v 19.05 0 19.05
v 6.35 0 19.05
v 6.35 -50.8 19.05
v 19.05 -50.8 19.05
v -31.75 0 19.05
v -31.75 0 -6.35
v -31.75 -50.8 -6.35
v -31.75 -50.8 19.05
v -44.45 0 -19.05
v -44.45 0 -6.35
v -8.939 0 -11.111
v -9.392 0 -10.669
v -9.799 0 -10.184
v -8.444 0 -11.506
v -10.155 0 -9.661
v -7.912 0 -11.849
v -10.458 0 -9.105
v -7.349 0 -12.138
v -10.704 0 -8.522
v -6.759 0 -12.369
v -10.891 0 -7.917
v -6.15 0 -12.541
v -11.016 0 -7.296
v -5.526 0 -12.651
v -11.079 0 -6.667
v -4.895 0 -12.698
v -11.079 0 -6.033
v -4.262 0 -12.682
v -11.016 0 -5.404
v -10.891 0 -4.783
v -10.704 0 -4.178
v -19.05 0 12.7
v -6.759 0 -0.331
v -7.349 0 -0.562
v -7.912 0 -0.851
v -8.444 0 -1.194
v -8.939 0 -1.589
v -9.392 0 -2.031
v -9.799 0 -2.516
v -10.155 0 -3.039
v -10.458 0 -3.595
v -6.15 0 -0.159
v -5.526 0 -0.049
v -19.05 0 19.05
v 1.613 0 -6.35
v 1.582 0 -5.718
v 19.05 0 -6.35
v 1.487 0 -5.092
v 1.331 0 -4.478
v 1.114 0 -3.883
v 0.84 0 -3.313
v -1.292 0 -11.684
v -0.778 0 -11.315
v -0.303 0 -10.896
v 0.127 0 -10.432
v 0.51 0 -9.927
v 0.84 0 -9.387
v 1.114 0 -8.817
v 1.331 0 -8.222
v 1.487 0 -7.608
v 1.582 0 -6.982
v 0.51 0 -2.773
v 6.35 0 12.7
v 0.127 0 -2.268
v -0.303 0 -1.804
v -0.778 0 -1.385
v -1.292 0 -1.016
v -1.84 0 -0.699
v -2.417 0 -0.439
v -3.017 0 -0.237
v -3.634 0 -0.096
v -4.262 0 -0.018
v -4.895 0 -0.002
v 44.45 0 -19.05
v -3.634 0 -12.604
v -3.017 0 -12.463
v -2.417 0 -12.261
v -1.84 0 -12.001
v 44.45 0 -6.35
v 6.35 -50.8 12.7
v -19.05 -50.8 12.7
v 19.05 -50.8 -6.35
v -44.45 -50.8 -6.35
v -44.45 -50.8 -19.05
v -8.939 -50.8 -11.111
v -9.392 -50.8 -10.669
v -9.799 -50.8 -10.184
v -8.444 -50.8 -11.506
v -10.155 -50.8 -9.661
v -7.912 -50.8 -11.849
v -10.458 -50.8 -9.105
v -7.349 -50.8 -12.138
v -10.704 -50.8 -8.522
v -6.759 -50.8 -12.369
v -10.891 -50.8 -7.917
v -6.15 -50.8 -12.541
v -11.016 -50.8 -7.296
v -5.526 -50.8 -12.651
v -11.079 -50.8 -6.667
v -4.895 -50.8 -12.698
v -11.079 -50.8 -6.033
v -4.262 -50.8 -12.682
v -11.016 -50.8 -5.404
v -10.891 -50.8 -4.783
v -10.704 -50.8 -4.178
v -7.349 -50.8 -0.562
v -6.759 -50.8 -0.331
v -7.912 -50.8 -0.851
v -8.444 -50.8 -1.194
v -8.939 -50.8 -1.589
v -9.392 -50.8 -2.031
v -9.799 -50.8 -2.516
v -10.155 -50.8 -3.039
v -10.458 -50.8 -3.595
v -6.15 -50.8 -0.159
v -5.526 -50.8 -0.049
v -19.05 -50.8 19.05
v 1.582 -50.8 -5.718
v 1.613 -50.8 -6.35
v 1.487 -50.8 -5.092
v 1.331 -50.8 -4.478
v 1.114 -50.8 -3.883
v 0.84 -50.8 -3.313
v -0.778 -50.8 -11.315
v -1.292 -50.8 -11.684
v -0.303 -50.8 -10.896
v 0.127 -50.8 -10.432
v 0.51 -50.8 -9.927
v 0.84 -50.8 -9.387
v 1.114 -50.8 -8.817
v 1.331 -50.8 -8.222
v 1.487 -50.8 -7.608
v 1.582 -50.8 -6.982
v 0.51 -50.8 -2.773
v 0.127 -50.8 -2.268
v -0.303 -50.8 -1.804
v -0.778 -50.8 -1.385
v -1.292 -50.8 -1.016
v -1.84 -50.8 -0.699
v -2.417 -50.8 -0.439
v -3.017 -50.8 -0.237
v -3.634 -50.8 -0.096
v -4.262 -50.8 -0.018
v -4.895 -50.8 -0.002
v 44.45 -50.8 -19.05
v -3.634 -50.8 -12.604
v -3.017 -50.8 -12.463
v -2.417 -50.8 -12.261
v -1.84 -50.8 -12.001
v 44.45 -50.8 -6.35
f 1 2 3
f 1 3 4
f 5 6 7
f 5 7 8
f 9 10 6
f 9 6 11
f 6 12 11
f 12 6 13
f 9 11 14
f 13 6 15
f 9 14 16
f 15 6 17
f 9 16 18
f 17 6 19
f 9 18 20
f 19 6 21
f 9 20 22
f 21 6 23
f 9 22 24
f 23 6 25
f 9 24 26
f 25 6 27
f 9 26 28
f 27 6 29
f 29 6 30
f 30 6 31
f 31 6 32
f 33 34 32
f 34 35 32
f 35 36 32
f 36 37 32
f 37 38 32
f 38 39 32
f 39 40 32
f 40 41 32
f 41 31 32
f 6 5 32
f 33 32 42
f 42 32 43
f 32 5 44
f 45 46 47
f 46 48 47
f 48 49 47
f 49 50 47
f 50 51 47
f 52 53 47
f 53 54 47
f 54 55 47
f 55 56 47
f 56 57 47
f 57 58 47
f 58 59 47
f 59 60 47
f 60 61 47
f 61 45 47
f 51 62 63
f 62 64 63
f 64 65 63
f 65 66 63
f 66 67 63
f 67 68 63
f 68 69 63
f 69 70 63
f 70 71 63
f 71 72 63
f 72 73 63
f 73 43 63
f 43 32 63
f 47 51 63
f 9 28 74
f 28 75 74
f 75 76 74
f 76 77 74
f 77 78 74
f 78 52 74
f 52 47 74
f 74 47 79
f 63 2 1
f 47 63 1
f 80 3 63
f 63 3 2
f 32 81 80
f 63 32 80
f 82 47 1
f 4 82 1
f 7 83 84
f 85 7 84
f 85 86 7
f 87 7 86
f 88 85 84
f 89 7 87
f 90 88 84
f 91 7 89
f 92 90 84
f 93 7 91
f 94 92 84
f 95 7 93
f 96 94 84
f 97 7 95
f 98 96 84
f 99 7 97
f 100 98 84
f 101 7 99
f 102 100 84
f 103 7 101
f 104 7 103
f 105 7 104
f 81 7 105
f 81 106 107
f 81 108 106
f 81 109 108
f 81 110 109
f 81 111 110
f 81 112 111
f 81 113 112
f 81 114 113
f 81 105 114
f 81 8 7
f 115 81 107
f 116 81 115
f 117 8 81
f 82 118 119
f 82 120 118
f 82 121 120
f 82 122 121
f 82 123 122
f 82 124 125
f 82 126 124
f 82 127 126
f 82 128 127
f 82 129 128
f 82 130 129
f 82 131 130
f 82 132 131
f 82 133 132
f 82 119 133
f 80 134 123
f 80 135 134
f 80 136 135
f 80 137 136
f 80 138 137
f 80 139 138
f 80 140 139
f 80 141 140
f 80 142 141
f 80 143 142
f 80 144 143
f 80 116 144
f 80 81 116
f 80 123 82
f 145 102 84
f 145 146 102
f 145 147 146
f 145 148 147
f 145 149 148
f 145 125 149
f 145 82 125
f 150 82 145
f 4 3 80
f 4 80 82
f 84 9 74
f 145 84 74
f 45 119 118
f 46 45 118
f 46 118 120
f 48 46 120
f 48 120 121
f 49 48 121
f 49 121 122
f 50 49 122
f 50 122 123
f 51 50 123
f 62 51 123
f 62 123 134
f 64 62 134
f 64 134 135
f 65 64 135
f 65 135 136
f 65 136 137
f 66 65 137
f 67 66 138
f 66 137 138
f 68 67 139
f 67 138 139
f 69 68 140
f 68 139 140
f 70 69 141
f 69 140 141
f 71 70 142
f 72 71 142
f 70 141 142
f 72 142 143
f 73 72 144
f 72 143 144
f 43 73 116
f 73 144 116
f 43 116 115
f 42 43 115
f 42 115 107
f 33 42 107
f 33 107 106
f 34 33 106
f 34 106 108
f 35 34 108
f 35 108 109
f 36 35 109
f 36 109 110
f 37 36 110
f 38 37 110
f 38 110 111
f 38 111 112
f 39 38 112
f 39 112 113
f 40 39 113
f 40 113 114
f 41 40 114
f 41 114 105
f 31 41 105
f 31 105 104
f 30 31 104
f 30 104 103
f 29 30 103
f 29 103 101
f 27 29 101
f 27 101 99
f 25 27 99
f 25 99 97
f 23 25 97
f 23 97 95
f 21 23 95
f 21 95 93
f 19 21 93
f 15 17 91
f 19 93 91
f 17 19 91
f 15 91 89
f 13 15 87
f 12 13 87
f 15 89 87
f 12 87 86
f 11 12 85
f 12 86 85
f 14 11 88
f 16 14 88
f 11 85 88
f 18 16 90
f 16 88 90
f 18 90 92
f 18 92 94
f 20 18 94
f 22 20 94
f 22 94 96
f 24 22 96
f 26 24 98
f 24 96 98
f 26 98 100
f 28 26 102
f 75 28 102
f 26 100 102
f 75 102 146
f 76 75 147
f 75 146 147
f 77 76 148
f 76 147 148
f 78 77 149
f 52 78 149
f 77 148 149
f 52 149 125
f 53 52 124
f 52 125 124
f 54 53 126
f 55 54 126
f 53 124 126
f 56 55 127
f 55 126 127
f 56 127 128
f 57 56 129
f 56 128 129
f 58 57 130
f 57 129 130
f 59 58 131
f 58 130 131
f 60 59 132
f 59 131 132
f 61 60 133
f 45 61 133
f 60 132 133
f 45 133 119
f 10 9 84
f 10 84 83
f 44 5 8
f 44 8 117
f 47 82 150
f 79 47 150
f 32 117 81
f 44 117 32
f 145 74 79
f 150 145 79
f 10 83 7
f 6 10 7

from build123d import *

# Parameters (mm, degrees)
F0_W     = 88.9
F0_H     = 38.1
F1_DEPTH = 50.8
F2_W     = 12.7
F2_H     = 25.4
F3_DEPTH = 50.801
F4_W     = 25.4
F4_H     = 25.4
F5_DEPTH = 50.801
F6_R     = 6.35
F7_DEPTH = 50.801
F8_W     = 25.4
F8_H     = 50.8
F9_DEPTH = 6.35


with BuildPart() as f1:
    # F0 (on Front) → F1 (new body)
    with BuildSketch(Plane.XZ):
        Rectangle(F0_W, F0_H)
    extrude(amount=F1_DEPTH)

    # F2 (on face) → F3 (cut, through all)
    with BuildSketch(Plane.XZ.offset(50.8)):
        with Locations((-38.1, 6.35)):
            Rectangle(F2_W, F2_H)
    extrude(amount=-F3_DEPTH, mode=Mode.SUBTRACT)

    # F4 (on face) → F5 (cut, through all)
    with BuildSketch(Plane.XZ.offset(50.8)):
        with Locations((31.75, 6.35)):
            Rectangle(F4_W, F4_H)
    extrude(amount=-F5_DEPTH, mode=Mode.SUBTRACT)

    # F6 (on face) → F7 (cut, through all)
    with BuildSketch(Plane.XZ.offset(50.8)):
        with Locations((-4.736888, -6.35)):
            Circle(F6_R)
    extrude(amount=-F7_DEPTH, mode=Mode.SUBTRACT)

    # F8 (on face) → F9 (cut)
    with BuildSketch(Plane.XY.offset(19.05)):
        with Locations((-6.35, -25.4)):
            Rectangle(F8_W, F8_H)
    extrude(amount=-F9_DEPTH, mode=Mode.SUBTRACT)


solid = f1.part
